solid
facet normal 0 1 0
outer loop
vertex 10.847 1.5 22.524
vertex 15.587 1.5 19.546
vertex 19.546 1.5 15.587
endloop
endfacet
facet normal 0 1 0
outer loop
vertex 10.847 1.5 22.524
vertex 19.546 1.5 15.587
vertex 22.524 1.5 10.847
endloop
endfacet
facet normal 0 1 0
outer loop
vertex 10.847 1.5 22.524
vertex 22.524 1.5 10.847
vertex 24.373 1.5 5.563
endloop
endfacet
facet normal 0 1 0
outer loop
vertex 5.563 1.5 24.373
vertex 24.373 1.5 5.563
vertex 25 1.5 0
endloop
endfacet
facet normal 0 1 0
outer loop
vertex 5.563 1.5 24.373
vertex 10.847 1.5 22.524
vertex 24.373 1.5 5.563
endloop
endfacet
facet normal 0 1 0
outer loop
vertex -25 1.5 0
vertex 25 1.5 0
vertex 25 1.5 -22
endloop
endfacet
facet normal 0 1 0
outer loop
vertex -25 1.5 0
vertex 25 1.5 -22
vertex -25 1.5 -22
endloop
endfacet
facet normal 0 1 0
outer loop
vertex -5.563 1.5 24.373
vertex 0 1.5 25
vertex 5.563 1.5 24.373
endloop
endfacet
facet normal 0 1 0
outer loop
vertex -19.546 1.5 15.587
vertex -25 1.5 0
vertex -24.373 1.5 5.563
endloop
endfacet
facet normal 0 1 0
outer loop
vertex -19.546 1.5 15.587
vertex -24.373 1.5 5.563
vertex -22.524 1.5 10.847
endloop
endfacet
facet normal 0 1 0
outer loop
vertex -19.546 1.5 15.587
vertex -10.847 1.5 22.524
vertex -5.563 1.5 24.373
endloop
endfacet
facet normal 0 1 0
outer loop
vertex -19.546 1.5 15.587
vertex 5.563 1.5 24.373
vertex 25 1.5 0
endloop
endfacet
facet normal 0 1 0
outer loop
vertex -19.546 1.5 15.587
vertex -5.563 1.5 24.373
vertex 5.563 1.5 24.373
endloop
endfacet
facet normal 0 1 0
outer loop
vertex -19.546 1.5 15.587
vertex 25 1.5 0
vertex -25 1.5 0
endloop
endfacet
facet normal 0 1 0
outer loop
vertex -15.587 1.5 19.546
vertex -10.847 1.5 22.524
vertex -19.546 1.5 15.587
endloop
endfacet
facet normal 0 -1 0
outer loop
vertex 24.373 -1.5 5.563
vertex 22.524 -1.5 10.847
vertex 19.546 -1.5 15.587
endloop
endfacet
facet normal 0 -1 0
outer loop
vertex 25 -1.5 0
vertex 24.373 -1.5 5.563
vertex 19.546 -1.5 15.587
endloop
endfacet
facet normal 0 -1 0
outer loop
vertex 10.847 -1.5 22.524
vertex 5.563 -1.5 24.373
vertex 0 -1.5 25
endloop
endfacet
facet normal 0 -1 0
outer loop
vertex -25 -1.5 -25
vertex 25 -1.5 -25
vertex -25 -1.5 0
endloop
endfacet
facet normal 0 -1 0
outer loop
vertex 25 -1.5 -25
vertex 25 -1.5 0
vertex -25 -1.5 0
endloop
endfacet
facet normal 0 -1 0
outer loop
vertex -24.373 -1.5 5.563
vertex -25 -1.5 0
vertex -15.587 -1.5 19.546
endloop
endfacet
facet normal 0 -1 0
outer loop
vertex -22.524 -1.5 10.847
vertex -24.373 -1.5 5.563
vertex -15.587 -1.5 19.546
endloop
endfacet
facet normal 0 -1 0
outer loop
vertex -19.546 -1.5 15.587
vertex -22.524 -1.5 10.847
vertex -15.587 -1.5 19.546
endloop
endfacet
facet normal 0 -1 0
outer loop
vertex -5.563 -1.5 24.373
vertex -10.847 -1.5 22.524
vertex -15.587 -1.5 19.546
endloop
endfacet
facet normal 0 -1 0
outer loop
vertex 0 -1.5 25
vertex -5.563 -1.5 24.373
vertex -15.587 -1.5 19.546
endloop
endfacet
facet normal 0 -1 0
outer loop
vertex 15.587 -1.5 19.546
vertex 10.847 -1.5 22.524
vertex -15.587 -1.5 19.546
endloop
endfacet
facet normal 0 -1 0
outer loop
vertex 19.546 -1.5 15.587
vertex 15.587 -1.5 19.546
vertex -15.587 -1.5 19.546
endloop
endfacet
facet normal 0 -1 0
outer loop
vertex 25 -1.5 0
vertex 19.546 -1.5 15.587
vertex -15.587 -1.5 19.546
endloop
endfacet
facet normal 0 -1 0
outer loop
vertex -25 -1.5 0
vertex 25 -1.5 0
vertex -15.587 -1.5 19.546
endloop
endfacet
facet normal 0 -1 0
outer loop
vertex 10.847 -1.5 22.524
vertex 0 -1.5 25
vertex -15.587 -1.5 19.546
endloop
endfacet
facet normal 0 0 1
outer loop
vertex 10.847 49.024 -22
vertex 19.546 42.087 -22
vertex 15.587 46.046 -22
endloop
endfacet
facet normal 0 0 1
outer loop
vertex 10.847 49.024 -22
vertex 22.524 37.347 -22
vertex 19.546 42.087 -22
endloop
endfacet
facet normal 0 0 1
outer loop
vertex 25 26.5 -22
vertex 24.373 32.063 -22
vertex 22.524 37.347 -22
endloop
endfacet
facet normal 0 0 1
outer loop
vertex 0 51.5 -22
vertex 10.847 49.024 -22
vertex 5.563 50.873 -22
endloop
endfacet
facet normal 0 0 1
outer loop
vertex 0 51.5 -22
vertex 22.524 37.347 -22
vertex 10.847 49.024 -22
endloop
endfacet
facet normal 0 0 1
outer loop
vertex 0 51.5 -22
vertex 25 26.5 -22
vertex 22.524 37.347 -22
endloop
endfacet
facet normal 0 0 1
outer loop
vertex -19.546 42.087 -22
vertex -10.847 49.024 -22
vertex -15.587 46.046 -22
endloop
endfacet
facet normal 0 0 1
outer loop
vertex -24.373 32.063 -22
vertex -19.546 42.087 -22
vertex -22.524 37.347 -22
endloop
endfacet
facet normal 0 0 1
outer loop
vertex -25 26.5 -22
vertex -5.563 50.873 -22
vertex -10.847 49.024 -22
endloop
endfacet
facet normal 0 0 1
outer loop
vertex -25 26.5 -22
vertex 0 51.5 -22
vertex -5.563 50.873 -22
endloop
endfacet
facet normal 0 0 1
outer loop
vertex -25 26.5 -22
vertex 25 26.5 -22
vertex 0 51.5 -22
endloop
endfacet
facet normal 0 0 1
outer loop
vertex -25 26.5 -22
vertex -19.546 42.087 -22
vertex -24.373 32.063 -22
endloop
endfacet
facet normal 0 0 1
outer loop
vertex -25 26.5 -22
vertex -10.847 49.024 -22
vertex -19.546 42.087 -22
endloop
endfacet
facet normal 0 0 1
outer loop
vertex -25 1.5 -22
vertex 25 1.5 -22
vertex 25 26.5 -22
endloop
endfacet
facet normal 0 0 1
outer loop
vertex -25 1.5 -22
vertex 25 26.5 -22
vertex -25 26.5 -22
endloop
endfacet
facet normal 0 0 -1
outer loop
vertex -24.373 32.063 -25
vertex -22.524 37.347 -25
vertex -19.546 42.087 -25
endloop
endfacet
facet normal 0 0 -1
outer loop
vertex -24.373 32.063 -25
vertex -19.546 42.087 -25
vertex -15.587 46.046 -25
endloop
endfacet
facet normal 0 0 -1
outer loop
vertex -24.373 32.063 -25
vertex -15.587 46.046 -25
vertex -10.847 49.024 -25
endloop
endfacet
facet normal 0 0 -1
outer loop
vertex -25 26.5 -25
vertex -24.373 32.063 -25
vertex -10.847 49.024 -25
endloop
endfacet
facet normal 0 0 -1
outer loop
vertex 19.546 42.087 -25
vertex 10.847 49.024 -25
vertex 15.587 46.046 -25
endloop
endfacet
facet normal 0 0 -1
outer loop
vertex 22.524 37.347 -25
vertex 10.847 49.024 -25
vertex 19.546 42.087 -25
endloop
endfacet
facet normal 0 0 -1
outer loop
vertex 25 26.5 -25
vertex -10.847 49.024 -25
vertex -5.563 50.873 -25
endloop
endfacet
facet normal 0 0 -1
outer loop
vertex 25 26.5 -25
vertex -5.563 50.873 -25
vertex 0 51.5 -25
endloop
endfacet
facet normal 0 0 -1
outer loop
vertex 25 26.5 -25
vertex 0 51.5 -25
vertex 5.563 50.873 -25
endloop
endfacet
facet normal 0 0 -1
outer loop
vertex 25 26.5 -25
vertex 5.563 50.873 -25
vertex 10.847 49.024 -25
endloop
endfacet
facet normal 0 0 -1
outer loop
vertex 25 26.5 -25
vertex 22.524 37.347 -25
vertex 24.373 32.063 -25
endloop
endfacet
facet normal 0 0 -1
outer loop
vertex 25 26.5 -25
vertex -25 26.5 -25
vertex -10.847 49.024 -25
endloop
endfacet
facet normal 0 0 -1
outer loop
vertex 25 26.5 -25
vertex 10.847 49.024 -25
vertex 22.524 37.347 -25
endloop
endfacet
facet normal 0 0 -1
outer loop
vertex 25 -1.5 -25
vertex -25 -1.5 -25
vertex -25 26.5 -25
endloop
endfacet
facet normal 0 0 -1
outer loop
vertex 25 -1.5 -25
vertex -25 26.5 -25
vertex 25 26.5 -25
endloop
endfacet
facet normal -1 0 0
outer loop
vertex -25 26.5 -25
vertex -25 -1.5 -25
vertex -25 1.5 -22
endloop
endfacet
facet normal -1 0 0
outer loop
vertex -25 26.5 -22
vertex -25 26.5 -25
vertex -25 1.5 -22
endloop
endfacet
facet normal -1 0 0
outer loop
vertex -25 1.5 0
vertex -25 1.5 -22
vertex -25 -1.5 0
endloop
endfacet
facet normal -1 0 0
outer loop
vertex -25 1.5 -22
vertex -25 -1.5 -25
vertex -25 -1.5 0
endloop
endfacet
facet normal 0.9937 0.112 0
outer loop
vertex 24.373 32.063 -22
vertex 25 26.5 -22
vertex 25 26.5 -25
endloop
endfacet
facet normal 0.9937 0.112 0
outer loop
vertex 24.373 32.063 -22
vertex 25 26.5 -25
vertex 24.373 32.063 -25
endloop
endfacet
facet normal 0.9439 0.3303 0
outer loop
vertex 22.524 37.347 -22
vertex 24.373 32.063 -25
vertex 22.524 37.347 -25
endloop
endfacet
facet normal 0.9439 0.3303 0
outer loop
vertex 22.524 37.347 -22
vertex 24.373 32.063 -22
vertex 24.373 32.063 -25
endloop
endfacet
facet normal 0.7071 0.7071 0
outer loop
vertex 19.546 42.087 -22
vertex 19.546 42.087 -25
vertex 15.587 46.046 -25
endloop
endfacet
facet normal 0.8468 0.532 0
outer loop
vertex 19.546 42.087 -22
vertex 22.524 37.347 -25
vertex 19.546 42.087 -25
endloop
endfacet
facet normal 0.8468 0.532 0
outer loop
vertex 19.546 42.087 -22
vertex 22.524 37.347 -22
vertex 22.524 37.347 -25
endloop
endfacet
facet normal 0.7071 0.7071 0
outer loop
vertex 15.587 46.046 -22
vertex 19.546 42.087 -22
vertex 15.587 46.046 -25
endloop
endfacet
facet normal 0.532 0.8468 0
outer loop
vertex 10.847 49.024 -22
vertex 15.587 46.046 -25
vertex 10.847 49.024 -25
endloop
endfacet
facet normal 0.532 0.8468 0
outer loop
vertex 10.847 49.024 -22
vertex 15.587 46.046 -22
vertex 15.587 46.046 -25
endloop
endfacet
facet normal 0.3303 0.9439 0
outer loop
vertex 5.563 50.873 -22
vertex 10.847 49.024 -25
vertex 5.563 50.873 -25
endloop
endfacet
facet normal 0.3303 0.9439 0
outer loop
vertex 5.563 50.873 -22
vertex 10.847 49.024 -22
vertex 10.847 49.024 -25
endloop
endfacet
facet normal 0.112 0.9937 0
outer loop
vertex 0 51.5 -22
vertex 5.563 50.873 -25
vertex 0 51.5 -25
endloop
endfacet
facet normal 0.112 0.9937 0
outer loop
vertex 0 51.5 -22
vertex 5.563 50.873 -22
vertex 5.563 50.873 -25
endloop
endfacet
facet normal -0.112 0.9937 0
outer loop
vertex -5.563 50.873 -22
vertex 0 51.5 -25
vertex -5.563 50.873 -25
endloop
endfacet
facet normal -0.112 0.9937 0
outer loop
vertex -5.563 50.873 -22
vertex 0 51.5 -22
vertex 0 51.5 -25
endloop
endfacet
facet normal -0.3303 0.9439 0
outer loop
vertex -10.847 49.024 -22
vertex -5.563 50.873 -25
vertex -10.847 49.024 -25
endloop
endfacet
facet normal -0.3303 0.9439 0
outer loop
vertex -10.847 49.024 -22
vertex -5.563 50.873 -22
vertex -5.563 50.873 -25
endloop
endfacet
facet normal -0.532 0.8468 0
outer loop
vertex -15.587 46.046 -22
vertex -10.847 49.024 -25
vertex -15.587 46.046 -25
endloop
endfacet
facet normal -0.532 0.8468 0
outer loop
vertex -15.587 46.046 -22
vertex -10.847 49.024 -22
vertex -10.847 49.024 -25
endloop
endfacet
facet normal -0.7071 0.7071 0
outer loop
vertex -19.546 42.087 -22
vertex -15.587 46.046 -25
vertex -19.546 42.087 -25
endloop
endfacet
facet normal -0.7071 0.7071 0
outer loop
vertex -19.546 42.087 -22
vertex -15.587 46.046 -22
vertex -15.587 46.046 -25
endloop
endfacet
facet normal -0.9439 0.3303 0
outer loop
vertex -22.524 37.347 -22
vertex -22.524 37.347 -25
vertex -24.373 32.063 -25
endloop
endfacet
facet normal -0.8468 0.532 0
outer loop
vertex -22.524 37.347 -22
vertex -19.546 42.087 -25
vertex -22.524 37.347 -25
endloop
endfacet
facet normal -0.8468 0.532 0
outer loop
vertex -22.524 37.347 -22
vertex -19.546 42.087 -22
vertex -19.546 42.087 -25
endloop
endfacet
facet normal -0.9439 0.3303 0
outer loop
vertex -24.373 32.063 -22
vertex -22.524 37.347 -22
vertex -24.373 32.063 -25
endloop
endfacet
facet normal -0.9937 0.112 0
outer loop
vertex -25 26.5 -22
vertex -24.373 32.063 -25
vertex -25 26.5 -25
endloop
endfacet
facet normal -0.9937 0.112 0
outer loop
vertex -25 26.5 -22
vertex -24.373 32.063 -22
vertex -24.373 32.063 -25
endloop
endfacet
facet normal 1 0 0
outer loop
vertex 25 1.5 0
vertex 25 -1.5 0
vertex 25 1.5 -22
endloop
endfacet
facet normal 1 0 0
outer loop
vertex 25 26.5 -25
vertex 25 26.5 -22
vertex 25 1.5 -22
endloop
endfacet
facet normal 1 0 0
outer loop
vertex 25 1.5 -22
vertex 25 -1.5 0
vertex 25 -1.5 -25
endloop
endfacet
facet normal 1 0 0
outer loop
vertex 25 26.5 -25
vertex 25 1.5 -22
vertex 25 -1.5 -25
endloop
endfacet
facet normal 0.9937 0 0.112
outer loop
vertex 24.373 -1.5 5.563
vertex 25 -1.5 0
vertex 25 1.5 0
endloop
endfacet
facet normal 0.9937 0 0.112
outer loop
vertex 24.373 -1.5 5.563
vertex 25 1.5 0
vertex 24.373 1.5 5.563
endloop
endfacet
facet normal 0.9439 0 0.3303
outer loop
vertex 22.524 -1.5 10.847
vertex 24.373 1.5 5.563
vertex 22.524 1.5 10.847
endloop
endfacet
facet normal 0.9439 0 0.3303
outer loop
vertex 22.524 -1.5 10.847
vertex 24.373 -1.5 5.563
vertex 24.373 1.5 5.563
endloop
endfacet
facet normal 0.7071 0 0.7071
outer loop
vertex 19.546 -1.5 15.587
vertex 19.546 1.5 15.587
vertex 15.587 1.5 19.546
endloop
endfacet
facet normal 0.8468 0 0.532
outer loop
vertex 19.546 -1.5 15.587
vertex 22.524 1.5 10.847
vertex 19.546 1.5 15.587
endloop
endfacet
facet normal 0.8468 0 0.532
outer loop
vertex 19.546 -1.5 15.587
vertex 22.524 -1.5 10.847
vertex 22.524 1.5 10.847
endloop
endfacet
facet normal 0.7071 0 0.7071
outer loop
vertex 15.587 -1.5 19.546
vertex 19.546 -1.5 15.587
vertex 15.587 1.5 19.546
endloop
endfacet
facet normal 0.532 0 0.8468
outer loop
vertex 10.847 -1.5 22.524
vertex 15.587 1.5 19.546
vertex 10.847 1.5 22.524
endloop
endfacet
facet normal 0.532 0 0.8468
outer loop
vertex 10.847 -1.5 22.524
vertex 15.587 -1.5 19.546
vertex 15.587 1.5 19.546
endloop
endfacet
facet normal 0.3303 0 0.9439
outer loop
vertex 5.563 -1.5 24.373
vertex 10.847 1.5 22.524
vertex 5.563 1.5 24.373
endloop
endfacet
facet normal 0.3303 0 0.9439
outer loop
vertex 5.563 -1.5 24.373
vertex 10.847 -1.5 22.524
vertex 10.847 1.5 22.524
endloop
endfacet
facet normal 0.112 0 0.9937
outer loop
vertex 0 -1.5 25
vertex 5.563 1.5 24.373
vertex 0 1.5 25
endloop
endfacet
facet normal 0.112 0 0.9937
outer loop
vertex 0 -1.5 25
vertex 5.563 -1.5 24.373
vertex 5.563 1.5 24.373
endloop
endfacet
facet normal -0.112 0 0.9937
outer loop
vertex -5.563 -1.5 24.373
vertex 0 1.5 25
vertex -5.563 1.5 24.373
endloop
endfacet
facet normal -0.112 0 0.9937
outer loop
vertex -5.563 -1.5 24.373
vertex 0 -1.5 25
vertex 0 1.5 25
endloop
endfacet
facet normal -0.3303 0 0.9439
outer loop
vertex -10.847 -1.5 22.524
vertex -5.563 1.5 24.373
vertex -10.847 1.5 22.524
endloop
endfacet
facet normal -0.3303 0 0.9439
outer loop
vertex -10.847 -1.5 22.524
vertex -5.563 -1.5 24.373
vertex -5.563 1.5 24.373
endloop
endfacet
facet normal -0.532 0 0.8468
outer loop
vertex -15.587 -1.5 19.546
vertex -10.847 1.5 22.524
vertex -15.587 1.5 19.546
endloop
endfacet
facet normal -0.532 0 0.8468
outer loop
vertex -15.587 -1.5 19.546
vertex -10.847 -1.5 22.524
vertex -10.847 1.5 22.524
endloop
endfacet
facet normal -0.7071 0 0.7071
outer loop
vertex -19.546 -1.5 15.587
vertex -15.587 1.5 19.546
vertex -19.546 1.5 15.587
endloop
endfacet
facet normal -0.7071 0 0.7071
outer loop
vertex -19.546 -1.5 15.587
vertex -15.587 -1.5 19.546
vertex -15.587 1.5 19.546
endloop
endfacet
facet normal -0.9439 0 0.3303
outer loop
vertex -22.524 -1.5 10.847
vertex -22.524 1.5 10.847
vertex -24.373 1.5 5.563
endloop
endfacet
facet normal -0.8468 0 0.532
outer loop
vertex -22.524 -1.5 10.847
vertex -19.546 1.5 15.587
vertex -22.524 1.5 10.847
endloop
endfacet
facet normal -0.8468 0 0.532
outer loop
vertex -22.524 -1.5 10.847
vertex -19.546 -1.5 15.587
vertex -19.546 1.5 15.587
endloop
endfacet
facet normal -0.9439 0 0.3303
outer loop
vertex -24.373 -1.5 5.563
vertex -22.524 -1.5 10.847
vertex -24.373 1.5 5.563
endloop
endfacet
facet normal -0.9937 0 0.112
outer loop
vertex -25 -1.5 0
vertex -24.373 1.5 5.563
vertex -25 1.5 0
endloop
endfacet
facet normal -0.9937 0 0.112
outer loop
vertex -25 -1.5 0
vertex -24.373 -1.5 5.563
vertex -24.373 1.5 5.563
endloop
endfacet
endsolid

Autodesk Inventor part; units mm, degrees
ref_plane "YZ Plane" through (0, 0, 0) normal (1, 0, 0) x (0, 1, 0)
ref_plane "XZ Plane" through (0, 0, 0) normal (0, 1, 0) x (-1, 0, 0)
ref_plane "XY Plane" through (0, 0, 0) normal (0, 0, 1) x (1, 0, 0)
sketch "草圖1" plane through (0, 0, 0) normal (0, 1, 0) x (-1, 0, 0)
  circle A0 centre (0, 0) radius 25
  line L0 (25, 0) -> (-25, 0)
  line L1 (-25, 0) -> (-25, -25)
  line L2 (-25, -25) -> (25, -25)
  line L3 (25, -25) -> (25, 0)
  dimension "d0" = 50
extrude "擠出1" add sketch "草圖1" along normal mid plane 3
sketch "草圖2" plane through (0, 1.5, 0) normal (0, 1, 0) x (1, 0, 0)
  line L0 (-25, 25) -> (-25, 0) projected
  line L1 (25, 0) -> (25, 25) projected
  line L2 (-25, 25) -> (25, 25)
  line L3 (25, 25) -> (25, 22)
  line L4 (25, 22) -> (-25, 22)
  line L5 (-25, 22) -> (-25, 25)
  point P0 (0, 0)
  dimension "d3" = 3
extrude "擠出2" add sketch "草圖2" along normal blind 50
sketch "草圖3" plane through (-25, 1.5, -22) normal (0, 0, 1) x (1, 0, 0)
  circle A0 centre (25, 25) radius 25
  line L0 (0, 50) -> (50, 50) projected
  line L1 (50, 0) -> (50, 50) projected
  line L2 (50, 0) -> (0, 0) projected
  line L3 (50, 0) -> (50, 50) projected
  line L4 (0, 50) -> (50, 50) projected
  line L5 (0, 0) -> (0, 50) projected
  point P0 (25, -1.5)
  point P1 (25, 50)
  point P2 (0, 25)
  point P3 (50, 25)
extrude "擠出3" cut sketch "草圖3" against normal up to surface (3 mm away) contours A0 L0 L1 | A0 L5 L0
properties part number "Base_1"
